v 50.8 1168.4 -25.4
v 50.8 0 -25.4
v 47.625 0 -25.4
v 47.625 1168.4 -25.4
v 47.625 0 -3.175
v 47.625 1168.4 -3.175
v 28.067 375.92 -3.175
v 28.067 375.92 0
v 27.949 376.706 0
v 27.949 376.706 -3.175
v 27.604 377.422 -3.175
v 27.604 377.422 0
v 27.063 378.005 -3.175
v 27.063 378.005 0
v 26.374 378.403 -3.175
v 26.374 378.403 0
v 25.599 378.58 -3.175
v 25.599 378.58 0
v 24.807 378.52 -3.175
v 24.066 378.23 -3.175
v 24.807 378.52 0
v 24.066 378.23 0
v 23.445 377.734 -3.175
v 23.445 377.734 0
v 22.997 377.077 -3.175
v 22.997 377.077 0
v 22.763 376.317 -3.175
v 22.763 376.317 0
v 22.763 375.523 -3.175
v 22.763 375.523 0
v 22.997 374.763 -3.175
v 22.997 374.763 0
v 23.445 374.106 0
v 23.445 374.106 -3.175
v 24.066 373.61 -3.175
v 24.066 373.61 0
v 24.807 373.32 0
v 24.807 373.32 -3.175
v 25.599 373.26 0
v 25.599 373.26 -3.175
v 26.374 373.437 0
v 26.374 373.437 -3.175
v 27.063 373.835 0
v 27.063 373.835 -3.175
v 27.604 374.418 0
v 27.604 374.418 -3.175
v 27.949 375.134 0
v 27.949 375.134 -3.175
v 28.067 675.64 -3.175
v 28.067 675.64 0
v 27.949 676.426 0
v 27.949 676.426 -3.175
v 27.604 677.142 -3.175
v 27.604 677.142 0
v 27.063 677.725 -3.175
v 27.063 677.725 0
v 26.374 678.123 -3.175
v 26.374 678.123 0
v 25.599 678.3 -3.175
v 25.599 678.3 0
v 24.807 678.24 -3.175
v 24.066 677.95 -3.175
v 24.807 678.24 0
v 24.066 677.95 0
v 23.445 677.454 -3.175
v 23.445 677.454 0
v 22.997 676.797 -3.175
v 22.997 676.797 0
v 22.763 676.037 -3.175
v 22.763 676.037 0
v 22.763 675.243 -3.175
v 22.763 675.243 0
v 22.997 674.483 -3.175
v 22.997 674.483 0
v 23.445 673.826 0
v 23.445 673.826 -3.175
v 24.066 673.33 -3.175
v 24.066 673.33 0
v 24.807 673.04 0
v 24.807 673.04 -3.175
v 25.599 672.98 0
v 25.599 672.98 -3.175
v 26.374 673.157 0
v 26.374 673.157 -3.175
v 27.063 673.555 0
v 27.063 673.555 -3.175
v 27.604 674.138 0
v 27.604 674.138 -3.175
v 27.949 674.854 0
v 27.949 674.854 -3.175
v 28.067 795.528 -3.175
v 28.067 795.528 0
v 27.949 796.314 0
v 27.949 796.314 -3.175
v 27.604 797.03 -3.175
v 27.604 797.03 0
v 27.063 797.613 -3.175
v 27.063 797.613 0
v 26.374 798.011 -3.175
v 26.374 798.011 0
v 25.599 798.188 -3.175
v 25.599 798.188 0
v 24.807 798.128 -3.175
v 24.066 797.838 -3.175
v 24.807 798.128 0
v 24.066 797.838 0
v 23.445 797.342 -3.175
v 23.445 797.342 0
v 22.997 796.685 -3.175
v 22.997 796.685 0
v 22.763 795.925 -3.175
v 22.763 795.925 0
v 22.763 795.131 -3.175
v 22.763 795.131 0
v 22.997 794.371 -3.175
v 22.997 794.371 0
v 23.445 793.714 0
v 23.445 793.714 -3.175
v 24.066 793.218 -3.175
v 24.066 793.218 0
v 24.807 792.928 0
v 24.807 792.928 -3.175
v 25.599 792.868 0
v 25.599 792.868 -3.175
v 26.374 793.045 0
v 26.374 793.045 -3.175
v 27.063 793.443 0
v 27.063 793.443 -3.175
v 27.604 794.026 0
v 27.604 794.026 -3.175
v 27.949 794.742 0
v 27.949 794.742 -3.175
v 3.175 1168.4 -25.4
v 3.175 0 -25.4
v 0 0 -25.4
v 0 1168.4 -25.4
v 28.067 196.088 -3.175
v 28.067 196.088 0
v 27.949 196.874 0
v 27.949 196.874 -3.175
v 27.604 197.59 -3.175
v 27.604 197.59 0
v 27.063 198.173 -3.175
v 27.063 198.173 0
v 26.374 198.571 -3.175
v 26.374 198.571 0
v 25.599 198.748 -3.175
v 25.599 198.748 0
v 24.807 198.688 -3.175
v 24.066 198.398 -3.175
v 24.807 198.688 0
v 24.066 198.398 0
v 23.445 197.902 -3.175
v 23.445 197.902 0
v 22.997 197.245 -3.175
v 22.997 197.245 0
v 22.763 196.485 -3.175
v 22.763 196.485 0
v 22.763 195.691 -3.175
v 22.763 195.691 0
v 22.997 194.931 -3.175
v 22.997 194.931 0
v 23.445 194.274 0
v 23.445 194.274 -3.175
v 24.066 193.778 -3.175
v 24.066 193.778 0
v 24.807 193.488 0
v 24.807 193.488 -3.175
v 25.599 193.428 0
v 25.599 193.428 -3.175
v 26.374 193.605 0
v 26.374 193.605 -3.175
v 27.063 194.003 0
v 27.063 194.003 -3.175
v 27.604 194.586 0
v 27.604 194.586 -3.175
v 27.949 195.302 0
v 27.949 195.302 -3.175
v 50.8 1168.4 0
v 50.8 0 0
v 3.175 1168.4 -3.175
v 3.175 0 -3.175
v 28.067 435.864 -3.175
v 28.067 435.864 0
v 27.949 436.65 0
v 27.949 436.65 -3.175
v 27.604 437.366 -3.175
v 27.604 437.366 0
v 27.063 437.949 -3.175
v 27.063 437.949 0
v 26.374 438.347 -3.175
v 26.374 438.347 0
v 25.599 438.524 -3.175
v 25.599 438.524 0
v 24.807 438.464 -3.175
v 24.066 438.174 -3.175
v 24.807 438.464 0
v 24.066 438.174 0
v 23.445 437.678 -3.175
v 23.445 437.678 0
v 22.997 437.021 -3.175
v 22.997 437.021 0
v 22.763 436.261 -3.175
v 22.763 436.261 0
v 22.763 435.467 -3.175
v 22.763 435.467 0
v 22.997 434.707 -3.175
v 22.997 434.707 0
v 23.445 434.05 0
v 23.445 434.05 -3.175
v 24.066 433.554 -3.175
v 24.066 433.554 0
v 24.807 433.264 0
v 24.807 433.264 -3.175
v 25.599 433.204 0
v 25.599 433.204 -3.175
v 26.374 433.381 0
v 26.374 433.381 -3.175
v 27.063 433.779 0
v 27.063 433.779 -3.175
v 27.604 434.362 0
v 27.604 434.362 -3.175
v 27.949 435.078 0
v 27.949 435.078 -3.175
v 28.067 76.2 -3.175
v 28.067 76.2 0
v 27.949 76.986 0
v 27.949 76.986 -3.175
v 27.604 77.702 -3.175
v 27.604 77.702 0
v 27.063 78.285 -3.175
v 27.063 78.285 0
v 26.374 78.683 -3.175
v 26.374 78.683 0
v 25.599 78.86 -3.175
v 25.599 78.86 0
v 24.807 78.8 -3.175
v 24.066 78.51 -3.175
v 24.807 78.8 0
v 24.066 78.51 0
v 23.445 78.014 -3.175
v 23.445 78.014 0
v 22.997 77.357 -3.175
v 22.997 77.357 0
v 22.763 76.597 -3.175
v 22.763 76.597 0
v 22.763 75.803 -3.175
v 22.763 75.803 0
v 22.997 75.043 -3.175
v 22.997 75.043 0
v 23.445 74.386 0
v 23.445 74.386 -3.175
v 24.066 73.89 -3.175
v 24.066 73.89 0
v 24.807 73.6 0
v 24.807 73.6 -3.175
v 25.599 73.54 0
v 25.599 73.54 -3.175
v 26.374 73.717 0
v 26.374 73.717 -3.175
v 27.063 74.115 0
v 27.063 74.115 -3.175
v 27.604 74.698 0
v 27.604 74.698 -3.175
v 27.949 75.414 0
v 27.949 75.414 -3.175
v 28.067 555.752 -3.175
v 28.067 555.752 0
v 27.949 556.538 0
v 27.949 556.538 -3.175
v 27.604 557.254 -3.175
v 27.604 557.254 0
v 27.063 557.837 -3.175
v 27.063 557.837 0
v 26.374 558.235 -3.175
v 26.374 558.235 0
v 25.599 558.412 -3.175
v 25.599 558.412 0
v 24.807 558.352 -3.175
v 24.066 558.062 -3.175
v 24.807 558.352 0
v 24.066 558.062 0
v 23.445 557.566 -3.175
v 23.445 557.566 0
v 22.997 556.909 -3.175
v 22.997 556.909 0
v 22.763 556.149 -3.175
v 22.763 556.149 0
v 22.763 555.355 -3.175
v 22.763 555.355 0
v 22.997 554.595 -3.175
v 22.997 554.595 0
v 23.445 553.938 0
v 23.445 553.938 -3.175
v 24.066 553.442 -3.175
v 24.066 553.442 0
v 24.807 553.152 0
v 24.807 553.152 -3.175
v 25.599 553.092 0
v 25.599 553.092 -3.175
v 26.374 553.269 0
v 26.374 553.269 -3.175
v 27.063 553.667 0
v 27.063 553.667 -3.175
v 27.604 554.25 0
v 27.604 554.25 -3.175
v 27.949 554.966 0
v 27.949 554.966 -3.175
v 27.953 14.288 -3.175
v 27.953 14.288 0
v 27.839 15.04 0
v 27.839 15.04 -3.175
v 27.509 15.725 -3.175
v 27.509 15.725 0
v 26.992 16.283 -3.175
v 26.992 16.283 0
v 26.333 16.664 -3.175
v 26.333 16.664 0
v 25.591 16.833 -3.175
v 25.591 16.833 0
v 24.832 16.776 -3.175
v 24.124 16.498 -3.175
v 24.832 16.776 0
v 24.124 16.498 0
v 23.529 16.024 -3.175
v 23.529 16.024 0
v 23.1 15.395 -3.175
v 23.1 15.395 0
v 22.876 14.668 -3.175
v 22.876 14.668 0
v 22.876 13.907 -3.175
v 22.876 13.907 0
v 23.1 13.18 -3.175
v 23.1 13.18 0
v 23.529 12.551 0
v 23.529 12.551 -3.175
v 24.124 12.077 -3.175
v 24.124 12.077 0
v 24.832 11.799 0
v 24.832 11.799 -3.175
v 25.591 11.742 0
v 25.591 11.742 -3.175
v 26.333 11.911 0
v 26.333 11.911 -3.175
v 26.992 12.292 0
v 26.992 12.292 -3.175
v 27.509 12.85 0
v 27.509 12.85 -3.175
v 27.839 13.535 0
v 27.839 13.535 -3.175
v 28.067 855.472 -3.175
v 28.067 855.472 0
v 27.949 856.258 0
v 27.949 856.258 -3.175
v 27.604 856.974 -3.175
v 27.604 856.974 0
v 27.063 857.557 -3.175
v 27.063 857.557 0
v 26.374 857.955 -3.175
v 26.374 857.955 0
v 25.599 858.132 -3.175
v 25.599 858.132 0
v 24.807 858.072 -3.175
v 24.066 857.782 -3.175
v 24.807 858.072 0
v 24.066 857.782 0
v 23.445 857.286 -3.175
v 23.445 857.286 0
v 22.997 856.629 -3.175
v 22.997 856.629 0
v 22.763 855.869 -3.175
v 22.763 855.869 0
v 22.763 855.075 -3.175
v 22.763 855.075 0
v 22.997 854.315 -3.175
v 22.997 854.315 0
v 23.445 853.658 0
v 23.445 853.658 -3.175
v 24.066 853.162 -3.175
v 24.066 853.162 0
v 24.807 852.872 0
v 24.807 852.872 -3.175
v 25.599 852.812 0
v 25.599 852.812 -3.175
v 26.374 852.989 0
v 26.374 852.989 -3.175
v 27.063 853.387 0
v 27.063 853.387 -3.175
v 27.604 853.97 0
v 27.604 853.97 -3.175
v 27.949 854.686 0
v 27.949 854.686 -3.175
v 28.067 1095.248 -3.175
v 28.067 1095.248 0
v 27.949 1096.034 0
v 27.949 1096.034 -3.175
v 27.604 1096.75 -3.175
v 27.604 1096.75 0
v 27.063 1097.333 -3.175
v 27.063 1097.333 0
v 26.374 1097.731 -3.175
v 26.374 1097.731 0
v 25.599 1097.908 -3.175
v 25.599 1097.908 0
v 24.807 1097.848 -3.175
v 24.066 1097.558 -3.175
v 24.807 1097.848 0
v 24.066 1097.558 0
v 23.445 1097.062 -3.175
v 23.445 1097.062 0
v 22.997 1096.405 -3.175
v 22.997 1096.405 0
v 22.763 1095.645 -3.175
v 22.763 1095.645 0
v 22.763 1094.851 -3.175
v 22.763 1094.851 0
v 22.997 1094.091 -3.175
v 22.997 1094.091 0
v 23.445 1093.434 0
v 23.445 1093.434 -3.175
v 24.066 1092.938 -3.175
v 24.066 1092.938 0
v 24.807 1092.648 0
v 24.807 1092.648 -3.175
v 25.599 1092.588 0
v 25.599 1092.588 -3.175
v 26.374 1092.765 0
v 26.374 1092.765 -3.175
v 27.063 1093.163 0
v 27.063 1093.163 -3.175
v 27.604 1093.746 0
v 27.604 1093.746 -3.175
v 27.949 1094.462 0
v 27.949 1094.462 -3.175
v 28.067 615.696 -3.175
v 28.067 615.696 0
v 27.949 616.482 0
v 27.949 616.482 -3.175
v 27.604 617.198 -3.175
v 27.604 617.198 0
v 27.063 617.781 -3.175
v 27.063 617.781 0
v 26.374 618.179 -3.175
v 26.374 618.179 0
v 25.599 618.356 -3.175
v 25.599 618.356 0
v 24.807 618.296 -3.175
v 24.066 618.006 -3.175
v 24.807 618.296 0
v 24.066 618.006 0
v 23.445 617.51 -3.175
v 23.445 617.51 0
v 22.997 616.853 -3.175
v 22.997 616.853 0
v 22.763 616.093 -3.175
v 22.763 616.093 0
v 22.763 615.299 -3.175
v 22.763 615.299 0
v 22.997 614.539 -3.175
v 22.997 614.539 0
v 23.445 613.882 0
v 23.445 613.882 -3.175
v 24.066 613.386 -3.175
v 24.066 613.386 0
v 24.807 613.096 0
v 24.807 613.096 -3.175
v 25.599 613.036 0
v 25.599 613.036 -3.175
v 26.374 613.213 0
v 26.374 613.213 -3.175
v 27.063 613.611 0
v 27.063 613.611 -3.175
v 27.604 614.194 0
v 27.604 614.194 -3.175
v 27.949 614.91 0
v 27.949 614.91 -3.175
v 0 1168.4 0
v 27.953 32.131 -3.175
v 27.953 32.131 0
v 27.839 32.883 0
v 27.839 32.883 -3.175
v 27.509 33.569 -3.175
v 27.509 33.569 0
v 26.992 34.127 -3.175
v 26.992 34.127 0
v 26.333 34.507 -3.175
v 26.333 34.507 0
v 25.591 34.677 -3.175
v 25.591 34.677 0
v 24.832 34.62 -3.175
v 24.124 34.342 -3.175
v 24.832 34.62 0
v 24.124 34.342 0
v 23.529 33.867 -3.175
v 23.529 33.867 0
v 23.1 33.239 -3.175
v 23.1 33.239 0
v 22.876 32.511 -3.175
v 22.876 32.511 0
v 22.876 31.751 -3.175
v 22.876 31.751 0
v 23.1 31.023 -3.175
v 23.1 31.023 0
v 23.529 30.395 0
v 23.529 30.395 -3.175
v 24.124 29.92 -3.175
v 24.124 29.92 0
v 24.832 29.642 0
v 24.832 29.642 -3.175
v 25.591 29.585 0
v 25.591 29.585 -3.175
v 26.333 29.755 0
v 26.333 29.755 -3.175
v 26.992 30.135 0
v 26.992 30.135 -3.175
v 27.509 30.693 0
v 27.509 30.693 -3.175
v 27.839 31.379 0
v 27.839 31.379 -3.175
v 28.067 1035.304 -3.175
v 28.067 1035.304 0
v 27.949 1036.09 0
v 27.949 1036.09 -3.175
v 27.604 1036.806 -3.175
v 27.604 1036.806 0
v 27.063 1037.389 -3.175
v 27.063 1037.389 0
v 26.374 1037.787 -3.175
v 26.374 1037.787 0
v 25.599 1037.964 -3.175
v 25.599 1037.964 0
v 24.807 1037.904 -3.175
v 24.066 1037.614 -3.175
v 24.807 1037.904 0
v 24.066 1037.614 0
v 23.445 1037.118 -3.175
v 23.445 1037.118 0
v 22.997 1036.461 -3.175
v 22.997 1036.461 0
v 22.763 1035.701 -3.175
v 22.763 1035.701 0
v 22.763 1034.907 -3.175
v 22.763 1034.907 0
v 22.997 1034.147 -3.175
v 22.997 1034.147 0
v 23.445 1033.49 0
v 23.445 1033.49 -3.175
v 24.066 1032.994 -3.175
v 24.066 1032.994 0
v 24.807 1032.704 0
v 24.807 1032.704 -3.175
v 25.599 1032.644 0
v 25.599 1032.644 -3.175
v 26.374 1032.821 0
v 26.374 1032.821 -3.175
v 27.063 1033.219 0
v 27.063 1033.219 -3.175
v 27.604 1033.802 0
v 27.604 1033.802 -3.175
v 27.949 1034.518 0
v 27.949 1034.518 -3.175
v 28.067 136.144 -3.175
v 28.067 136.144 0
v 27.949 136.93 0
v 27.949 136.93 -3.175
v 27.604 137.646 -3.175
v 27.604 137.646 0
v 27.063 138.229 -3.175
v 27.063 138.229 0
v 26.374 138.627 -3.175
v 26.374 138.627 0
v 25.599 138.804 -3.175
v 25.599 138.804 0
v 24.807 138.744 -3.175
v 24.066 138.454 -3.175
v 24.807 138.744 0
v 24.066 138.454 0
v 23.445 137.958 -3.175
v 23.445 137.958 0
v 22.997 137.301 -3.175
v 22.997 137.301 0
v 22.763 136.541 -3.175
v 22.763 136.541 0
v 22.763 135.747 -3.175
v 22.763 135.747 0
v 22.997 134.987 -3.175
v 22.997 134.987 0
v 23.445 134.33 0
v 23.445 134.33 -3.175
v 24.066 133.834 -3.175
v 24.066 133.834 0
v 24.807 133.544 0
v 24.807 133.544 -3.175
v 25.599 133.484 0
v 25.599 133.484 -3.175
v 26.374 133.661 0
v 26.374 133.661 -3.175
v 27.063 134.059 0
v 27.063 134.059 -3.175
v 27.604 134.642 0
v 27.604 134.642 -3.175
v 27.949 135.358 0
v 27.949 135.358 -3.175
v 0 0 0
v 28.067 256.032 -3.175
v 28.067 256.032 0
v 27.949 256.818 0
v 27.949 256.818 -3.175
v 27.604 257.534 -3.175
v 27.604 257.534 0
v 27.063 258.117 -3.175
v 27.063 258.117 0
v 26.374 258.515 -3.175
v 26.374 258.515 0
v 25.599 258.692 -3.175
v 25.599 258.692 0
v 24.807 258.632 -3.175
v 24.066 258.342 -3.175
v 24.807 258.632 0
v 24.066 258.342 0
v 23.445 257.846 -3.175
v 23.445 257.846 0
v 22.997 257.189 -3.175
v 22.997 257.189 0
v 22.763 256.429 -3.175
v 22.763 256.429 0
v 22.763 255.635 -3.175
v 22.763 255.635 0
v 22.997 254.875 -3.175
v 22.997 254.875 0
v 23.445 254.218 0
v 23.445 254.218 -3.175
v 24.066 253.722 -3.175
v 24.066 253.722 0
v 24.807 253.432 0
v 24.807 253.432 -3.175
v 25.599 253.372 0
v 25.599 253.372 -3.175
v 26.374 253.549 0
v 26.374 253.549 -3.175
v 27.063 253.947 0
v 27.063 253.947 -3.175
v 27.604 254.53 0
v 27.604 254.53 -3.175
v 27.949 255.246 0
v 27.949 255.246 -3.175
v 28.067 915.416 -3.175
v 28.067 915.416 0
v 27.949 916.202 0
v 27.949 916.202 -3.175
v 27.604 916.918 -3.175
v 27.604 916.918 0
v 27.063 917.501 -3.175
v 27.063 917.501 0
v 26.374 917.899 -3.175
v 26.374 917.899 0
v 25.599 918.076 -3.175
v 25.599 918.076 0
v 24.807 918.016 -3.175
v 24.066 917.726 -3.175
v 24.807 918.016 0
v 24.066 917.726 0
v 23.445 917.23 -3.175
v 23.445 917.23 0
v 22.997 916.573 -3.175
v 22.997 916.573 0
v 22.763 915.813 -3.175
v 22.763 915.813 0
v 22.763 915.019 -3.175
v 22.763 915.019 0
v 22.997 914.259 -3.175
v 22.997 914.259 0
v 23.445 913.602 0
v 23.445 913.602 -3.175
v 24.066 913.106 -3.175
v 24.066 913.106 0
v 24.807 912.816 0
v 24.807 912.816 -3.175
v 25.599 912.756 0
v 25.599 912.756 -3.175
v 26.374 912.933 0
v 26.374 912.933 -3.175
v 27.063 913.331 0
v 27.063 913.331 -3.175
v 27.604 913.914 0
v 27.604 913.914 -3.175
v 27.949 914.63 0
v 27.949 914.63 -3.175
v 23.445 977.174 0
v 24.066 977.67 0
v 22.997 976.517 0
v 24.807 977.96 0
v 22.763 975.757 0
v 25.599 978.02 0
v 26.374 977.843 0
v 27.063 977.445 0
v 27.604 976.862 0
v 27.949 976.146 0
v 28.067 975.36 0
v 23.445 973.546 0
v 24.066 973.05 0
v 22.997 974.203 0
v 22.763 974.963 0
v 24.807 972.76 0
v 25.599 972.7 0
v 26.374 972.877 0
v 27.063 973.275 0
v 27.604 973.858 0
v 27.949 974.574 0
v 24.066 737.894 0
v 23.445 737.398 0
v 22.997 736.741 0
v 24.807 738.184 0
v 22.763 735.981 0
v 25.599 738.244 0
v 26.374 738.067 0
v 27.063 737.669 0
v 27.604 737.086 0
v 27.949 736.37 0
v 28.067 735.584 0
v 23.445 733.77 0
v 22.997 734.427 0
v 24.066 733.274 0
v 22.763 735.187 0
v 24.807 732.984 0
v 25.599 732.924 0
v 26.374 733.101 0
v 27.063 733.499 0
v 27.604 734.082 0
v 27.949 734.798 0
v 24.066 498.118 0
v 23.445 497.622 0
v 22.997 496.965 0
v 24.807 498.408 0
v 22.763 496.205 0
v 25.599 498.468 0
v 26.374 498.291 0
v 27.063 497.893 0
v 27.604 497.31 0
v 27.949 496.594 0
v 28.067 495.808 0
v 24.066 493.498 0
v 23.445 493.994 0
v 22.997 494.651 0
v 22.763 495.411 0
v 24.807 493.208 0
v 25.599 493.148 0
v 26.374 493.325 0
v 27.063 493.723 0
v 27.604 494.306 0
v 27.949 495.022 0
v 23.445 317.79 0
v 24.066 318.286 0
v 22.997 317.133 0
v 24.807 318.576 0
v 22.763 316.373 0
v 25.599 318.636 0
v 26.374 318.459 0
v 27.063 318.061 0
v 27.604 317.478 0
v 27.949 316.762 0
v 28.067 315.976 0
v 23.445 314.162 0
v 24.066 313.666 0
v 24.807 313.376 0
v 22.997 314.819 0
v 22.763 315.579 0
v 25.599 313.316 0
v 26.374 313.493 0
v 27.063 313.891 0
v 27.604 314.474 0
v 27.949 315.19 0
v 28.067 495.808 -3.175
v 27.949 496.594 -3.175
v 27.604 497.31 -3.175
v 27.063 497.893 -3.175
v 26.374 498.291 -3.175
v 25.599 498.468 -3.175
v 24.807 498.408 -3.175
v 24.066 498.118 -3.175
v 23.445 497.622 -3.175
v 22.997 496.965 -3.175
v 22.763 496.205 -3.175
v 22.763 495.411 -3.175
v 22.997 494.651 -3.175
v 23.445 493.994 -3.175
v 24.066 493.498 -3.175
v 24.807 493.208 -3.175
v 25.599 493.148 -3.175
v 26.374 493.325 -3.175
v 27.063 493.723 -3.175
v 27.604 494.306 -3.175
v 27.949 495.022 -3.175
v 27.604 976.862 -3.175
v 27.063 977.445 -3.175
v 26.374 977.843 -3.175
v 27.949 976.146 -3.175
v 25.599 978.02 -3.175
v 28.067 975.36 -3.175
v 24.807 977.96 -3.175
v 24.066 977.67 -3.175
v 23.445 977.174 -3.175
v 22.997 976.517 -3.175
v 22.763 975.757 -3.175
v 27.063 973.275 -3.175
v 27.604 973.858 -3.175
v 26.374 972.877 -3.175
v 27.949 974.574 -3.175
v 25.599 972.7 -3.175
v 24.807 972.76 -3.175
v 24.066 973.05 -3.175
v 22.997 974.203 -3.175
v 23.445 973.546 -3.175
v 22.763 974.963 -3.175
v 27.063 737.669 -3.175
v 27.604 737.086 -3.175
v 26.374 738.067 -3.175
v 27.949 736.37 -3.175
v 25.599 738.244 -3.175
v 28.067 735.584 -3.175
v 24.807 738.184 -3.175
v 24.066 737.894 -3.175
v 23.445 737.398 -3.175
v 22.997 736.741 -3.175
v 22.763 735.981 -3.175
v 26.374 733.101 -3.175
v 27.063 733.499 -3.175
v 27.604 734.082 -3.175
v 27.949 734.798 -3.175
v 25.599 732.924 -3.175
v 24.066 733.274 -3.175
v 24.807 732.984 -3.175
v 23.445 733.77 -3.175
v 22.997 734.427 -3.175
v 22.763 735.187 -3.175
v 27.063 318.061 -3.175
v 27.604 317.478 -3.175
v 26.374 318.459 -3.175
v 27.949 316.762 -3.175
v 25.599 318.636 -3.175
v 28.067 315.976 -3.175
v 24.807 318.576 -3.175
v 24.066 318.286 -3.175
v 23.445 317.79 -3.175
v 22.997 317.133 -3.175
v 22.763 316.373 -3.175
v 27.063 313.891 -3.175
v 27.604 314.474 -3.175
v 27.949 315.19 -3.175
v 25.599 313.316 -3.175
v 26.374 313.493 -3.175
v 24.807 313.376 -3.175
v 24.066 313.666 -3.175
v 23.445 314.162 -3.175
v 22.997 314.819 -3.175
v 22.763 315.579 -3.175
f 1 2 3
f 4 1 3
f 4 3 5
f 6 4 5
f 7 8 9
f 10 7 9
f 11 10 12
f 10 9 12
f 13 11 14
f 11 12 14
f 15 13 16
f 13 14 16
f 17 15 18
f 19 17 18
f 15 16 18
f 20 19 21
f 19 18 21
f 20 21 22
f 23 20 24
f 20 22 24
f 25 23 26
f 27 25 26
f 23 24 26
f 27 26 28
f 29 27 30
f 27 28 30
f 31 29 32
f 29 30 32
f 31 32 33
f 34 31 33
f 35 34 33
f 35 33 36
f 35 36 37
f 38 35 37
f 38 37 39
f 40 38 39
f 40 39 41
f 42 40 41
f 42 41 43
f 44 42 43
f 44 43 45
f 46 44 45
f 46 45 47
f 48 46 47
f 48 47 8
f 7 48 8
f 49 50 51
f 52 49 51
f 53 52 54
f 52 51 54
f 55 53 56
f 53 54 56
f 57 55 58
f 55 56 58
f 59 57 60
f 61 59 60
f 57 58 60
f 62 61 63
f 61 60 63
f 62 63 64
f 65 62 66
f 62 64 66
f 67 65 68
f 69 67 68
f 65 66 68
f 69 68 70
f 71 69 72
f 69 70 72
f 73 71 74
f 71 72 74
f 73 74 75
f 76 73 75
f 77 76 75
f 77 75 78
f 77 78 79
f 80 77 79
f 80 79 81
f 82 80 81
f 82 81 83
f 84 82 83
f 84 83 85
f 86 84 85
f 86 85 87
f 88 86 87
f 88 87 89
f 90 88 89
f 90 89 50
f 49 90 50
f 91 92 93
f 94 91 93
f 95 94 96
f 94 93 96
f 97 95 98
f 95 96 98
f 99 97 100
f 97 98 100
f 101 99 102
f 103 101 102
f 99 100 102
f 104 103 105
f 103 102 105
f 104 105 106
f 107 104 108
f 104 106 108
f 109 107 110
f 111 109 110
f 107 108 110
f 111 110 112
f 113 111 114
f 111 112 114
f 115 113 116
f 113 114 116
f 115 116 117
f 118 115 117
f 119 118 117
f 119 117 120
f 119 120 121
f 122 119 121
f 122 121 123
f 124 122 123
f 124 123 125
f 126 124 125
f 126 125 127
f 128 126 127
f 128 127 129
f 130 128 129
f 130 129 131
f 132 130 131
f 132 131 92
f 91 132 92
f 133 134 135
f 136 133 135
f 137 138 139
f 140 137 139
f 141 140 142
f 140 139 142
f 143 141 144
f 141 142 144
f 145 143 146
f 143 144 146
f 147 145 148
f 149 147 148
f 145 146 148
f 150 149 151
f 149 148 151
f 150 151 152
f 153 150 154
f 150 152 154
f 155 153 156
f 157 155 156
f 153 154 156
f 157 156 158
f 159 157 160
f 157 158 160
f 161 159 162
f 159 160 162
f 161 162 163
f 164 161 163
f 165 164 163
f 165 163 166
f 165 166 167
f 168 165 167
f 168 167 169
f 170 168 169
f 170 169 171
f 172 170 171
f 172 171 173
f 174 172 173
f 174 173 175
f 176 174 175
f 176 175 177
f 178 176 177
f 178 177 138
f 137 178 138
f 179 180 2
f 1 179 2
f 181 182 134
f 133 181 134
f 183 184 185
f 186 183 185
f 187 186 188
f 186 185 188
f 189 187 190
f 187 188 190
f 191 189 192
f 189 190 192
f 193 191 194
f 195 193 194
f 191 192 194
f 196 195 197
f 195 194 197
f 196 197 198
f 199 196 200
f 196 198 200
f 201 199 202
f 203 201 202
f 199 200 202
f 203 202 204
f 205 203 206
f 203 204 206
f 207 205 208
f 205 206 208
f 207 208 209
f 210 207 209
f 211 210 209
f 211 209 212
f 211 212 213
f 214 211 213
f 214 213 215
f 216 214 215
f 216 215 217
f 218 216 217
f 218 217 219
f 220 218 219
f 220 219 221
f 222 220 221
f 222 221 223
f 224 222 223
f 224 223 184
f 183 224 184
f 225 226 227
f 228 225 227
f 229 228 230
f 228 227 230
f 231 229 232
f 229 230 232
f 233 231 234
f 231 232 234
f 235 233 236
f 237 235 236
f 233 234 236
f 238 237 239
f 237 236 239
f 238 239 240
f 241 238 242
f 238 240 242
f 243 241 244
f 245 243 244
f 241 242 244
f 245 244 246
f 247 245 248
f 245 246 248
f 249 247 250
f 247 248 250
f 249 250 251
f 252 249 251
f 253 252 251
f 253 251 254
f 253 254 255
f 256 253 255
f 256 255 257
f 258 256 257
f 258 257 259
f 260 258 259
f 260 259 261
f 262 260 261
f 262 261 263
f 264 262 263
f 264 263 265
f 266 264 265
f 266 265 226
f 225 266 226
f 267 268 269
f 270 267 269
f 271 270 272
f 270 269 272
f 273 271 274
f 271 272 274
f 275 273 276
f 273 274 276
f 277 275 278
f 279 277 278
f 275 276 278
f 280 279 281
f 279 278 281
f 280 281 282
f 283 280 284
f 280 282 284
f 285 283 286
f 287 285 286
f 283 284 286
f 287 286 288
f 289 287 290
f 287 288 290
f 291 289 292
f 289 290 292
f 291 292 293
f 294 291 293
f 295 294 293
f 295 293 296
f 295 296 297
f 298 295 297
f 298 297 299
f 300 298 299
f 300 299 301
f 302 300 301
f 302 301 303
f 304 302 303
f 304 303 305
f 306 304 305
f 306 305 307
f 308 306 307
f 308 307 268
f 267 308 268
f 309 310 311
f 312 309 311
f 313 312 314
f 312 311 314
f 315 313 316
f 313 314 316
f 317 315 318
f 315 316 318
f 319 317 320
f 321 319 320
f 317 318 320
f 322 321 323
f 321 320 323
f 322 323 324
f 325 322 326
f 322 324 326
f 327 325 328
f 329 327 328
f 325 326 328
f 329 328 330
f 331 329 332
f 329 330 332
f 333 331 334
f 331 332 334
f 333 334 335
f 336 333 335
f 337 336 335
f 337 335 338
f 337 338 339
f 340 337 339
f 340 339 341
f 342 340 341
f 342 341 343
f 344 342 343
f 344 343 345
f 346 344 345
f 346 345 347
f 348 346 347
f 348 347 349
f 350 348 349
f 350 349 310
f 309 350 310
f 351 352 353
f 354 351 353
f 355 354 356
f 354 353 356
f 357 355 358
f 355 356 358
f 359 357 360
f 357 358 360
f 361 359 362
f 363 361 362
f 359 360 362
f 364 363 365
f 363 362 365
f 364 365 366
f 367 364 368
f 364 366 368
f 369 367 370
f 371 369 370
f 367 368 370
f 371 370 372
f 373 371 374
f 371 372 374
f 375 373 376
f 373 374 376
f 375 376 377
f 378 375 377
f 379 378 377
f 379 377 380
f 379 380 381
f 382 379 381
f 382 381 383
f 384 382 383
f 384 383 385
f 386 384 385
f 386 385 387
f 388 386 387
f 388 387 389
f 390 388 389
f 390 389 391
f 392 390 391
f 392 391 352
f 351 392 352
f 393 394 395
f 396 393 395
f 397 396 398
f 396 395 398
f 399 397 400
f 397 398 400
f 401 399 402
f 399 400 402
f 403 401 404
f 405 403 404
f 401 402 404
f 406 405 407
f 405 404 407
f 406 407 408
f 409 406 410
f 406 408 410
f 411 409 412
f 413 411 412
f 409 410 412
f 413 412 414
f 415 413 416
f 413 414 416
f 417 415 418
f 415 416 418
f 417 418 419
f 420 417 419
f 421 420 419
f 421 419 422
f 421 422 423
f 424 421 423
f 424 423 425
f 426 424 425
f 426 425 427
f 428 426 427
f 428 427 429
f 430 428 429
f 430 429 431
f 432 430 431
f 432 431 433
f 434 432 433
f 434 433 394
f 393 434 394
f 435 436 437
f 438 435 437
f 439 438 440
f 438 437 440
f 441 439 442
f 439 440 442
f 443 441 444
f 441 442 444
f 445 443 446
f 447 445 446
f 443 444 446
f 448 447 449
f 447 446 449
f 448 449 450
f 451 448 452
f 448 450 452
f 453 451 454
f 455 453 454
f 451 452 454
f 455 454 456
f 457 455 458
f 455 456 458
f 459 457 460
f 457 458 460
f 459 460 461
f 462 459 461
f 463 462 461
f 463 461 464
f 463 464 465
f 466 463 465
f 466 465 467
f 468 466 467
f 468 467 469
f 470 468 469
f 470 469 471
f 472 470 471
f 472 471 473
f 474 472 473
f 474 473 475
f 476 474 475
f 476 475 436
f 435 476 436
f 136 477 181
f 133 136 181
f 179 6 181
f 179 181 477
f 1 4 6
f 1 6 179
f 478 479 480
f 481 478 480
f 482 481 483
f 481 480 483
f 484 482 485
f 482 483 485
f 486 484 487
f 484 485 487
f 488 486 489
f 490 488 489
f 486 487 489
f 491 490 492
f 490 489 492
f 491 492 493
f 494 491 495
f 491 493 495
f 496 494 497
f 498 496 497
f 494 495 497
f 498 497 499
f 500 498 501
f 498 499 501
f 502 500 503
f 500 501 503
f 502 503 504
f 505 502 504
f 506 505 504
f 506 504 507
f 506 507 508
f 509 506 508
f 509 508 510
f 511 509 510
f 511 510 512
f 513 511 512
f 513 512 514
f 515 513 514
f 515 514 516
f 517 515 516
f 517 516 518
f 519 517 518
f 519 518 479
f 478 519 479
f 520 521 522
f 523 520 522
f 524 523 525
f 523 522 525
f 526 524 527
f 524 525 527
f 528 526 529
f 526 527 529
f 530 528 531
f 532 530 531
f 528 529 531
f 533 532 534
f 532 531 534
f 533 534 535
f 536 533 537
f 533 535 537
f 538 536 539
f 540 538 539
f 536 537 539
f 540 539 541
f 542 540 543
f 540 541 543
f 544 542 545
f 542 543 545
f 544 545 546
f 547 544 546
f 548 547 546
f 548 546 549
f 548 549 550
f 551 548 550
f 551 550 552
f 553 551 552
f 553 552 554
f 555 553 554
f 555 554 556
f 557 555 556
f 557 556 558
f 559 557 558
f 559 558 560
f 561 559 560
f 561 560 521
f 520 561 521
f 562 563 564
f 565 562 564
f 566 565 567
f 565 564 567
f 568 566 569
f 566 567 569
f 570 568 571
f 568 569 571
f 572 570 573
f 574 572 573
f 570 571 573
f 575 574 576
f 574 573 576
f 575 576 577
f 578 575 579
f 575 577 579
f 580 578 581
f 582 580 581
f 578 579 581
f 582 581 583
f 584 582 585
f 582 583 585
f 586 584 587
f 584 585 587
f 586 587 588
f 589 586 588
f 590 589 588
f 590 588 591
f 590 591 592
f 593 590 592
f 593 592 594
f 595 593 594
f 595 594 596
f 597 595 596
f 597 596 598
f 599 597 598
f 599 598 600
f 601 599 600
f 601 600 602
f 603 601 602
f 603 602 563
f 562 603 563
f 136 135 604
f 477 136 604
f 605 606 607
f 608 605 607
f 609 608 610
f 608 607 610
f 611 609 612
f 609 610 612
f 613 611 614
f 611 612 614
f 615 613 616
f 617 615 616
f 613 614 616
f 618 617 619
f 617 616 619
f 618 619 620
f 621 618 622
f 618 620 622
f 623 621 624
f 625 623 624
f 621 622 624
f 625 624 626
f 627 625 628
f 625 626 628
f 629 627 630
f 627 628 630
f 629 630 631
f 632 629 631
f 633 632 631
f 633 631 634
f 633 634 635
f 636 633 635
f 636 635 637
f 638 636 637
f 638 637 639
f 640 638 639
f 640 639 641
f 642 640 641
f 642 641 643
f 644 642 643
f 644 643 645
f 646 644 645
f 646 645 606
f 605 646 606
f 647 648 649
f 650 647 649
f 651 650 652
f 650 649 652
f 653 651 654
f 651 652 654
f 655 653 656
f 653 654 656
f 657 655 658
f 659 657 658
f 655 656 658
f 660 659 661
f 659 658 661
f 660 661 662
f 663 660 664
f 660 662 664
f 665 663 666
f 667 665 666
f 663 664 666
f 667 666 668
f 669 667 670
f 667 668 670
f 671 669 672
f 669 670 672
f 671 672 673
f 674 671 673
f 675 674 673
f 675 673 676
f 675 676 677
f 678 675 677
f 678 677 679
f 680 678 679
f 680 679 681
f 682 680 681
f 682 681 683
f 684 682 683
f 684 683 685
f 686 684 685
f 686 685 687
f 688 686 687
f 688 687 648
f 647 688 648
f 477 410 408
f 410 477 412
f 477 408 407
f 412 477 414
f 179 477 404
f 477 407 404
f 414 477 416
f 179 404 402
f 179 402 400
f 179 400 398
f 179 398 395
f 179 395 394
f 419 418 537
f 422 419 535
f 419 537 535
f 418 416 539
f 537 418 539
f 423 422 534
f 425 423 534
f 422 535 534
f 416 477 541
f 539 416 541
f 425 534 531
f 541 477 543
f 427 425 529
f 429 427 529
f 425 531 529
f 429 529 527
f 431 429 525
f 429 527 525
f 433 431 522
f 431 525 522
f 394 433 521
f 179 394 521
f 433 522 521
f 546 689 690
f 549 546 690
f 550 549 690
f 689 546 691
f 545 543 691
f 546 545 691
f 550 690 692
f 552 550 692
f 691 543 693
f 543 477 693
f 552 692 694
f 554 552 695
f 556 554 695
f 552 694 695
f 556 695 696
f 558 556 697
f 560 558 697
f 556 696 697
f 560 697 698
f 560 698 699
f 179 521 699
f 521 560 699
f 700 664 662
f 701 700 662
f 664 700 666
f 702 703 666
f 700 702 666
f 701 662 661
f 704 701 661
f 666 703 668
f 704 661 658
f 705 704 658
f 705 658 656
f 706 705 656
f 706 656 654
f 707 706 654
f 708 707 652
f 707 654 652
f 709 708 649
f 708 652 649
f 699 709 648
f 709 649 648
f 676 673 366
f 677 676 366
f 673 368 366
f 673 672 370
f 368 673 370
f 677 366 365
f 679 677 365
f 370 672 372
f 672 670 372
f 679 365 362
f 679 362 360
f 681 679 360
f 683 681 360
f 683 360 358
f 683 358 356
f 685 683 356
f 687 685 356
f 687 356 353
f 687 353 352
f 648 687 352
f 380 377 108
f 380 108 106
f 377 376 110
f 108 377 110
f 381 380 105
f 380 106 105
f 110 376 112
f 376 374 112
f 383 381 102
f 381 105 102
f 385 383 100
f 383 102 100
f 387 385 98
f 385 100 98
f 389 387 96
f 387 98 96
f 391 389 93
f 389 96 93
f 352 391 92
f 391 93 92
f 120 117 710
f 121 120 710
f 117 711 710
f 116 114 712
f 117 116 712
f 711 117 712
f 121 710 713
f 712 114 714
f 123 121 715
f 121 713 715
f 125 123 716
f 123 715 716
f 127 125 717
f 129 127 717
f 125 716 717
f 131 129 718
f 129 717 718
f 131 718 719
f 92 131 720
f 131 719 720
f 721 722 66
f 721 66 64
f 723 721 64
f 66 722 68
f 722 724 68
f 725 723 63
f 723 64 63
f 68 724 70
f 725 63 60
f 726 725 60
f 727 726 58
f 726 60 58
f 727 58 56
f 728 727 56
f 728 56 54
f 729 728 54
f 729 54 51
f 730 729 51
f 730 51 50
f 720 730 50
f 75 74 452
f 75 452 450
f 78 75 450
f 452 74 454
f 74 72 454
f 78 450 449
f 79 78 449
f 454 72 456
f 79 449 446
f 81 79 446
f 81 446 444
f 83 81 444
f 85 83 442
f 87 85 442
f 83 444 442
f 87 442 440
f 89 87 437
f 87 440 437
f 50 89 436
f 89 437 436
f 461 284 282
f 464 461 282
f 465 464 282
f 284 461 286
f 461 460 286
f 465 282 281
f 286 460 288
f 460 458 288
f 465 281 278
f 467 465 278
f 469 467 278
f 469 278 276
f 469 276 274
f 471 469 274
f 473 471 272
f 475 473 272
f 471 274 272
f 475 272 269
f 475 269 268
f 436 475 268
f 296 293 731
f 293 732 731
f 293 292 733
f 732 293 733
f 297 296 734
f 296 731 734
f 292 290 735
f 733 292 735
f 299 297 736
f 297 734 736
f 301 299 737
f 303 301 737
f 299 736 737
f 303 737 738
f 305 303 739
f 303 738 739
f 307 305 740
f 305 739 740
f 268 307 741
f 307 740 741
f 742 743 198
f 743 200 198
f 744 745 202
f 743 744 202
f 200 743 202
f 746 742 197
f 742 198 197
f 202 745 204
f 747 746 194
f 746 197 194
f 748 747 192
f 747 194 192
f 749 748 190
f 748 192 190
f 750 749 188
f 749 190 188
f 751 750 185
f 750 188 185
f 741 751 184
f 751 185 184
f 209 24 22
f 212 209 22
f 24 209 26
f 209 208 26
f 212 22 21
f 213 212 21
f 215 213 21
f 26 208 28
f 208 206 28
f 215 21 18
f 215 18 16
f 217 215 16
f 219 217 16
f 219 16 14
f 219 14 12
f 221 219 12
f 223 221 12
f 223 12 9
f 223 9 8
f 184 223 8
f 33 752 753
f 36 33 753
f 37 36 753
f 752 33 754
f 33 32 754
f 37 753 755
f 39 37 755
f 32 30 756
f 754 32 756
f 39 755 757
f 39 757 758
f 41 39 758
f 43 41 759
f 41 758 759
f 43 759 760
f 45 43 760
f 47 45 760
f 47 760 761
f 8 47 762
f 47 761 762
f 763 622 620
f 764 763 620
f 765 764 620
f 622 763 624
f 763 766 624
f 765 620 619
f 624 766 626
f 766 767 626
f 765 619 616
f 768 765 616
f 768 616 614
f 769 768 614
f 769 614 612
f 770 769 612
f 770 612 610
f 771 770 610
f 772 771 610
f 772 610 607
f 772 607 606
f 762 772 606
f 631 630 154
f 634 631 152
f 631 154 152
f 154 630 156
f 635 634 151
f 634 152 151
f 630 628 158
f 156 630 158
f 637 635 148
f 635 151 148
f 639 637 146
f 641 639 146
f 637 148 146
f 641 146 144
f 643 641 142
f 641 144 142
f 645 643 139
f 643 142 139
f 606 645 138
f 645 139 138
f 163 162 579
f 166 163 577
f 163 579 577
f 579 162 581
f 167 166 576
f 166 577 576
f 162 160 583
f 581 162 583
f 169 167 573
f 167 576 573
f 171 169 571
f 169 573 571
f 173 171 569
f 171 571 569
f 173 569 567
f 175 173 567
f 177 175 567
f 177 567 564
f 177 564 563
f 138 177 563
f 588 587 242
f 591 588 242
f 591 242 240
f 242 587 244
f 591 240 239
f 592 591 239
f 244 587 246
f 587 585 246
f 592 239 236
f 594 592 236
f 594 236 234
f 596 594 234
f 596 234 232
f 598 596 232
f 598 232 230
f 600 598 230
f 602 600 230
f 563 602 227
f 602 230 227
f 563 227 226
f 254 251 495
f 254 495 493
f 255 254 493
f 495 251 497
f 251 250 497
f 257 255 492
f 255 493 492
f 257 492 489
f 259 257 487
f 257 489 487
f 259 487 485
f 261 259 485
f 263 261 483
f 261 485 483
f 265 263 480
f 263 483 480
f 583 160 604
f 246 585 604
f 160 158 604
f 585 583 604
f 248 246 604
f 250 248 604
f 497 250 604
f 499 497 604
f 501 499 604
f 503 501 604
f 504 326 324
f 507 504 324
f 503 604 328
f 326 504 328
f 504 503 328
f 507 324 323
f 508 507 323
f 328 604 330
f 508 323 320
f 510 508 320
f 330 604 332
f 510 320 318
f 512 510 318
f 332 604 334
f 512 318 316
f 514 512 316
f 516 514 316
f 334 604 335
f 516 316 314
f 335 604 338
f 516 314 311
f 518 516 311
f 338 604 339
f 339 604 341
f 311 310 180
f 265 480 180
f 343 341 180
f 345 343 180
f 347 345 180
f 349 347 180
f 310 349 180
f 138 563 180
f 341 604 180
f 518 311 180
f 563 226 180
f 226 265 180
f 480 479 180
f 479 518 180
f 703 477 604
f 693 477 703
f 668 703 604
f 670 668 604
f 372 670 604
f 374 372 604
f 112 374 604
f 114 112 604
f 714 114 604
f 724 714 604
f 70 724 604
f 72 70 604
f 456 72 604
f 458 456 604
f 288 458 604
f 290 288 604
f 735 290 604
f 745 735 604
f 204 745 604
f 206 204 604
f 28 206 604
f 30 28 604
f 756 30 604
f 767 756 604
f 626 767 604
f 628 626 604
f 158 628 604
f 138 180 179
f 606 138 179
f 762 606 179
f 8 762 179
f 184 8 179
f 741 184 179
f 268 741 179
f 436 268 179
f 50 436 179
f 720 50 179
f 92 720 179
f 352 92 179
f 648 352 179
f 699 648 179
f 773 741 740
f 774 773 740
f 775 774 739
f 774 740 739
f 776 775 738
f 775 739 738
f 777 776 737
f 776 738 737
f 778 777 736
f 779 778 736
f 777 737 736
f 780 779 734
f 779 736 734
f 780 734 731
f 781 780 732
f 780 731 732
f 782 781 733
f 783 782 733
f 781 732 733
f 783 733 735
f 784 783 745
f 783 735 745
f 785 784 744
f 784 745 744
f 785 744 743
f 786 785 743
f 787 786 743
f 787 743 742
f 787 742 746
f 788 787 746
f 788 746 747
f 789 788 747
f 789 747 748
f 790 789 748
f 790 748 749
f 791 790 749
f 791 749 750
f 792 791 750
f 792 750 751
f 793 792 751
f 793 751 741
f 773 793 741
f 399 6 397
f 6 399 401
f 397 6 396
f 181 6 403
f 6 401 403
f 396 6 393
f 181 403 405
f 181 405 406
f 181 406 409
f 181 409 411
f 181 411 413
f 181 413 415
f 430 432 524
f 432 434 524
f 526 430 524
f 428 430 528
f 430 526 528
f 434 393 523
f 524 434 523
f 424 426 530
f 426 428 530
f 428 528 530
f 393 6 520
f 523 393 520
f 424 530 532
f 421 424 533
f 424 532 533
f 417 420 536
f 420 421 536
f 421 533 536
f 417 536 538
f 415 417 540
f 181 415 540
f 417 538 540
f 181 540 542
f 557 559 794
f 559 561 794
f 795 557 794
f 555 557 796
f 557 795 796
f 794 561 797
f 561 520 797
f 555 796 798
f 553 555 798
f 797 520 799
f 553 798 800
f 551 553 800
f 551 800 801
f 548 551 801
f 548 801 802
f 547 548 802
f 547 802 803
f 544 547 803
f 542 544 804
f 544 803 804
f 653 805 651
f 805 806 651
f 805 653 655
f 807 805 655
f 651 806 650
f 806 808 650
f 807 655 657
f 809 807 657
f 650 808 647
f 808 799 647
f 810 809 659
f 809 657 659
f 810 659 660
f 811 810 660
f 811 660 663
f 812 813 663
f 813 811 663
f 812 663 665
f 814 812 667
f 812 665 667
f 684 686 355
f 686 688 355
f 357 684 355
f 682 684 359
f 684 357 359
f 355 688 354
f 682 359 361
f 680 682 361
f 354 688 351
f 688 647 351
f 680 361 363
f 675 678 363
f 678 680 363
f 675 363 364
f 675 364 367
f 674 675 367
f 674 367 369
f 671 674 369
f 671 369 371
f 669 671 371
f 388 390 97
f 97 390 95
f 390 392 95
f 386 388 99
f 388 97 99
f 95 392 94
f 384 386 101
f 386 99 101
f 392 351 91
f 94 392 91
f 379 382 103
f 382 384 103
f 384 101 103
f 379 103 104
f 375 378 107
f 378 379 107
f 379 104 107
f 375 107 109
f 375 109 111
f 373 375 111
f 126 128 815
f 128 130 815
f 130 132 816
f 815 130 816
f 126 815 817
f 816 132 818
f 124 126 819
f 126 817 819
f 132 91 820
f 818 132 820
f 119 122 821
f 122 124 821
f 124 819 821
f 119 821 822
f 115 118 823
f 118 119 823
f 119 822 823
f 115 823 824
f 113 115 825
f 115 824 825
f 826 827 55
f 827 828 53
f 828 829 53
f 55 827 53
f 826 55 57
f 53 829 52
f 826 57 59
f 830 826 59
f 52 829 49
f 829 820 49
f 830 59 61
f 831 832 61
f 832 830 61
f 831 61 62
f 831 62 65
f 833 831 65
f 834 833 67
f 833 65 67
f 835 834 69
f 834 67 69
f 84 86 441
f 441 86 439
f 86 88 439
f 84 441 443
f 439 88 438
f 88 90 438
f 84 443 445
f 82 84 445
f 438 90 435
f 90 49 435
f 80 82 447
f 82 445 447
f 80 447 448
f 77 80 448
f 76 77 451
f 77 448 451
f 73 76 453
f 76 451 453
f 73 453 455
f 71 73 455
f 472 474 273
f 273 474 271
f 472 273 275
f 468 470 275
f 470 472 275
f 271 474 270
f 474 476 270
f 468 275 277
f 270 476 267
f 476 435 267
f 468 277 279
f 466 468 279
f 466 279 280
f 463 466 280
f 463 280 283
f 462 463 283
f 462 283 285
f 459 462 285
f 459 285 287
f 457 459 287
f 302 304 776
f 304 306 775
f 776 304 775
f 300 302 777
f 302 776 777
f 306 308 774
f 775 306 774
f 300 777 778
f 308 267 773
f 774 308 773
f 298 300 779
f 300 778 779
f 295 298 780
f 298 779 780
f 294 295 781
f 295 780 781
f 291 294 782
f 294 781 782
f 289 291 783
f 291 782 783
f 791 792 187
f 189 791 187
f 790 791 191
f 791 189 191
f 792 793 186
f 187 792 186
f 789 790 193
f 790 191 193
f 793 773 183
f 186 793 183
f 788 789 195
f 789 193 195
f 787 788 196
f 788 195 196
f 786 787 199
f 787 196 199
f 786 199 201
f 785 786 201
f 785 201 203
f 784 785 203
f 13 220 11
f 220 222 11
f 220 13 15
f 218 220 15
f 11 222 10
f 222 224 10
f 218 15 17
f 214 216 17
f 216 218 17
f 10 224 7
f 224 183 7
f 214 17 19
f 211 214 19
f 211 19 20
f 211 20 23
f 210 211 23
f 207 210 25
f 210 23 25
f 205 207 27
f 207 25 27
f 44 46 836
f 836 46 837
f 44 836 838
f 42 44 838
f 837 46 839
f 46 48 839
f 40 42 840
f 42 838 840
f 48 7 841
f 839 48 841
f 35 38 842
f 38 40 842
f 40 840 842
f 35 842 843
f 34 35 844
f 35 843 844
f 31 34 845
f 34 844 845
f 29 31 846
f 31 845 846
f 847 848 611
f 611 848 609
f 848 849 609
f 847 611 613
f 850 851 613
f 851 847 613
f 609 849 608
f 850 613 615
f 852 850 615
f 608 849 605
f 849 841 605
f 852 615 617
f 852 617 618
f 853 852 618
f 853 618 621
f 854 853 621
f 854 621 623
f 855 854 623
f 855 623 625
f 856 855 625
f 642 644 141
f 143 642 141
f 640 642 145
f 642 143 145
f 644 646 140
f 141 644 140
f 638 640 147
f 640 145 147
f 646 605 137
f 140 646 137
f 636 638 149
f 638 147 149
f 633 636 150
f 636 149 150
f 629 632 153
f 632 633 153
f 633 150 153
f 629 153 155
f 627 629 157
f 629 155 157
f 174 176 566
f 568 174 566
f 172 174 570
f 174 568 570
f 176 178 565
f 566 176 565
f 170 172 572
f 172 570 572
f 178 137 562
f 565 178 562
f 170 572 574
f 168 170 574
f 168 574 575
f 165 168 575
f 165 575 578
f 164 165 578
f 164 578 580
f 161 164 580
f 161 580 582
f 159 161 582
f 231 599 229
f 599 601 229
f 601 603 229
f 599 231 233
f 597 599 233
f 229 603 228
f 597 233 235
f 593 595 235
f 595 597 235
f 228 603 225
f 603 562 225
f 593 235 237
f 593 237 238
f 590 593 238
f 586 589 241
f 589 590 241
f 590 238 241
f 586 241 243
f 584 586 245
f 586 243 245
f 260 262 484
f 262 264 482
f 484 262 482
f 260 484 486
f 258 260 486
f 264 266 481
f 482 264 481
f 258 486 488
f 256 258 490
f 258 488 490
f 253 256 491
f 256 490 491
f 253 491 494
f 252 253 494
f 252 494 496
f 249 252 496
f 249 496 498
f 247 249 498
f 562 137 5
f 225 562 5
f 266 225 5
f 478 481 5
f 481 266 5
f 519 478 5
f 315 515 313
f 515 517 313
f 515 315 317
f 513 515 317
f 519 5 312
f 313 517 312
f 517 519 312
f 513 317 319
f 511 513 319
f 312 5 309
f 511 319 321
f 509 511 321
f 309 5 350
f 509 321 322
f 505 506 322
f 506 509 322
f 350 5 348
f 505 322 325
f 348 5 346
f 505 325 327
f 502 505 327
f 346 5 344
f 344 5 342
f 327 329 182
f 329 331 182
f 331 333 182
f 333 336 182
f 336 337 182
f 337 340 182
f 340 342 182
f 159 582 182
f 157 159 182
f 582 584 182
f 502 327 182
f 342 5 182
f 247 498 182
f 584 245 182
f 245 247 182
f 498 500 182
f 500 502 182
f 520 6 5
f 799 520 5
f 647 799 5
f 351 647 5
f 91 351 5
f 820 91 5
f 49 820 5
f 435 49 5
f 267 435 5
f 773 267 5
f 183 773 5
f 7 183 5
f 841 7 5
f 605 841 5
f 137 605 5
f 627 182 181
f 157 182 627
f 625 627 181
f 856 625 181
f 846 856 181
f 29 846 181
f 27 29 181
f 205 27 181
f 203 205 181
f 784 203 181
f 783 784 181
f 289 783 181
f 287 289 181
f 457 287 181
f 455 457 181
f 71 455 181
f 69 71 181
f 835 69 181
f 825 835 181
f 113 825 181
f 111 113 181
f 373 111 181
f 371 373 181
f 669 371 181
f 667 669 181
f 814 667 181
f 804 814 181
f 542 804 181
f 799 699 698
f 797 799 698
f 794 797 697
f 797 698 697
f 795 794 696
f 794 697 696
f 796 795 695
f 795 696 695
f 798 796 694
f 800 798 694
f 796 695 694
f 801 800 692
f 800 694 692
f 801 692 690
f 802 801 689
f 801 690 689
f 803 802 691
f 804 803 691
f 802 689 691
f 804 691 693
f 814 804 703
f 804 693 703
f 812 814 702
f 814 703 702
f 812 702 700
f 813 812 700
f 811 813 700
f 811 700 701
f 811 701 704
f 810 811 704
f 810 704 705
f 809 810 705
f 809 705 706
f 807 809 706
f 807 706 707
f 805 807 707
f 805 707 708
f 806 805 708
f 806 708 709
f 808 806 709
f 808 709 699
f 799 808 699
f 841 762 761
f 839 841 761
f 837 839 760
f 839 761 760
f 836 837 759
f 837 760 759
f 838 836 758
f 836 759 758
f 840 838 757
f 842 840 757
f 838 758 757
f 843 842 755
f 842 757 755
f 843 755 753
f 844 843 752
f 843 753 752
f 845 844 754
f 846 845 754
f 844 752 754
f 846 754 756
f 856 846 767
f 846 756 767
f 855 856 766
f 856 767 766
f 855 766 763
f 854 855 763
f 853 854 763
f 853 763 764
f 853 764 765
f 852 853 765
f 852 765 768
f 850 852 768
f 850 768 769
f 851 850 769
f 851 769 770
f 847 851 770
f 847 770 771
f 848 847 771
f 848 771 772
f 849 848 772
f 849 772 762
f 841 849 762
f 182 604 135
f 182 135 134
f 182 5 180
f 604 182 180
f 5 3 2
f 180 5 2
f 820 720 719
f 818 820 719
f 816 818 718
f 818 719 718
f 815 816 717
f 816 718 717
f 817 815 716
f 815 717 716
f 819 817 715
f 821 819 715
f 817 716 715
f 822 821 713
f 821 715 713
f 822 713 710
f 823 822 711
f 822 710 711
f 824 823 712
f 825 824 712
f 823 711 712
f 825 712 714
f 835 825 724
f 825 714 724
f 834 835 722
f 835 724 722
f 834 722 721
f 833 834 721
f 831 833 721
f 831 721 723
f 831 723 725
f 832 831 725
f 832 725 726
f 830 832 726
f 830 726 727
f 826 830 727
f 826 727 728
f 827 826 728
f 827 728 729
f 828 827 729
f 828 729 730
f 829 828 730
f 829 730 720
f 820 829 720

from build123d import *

# Parameters (mm, degrees)
BOSS_EXTRUDE1_DEPTH = 1168.4
CUT_EXTRUDE1_REACH  = 27.4
SKETCH2_R           = 2.667
CUT_EXTRUDE2_REACH  = 27.4
SKETCH3_R           = 2.5527


with BuildPart() as part:
    # Sketch1 → Boss-Extrude1 (new body)
    with BuildSketch(Plane(origin=(0, 0, 0), x_dir=(1, 0, 0), z_dir=(0, 1, 0))):
        Polygon((3.175, 3.175), (3.175, 25.4), (0, 25.4), (0, 0), (50.8, 0), (50.8, 25.4), (47.625, 25.4), (47.625, 3.175), align=None)
    extrude(amount=BOSS_EXTRUDE1_DEPTH)

    # Sketch2 → Cut-Extrude1 (cut, up to next)
    with BuildSketch(Plane.XY, mode=Mode.PRIVATE) as cut_extrude1_sk1:
        with Locations((25.4, 76.2)):
            Circle(SKETCH2_R)
    cut_extrude1_tool1 = extrude(cut_extrude1_sk1.sketch, amount=-CUT_EXTRUDE1_REACH, mode=Mode.PRIVATE) & part.part
    add(cut_extrude1_tool1.solids().sort_by_distance((25.4, 76.2, 0))[0], mode=Mode.SUBTRACT)
    # Sketch2 → Cut-Extrude1 (cut, up to next)
    with BuildSketch(Plane.XY, mode=Mode.PRIVATE) as cut_extrude1_sk2:
        with Locations((25.4, 136.144)):
            Circle(SKETCH2_R)
    cut_extrude1_tool2 = extrude(cut_extrude1_sk2.sketch, amount=-CUT_EXTRUDE1_REACH, mode=Mode.PRIVATE) & part.part
    add(cut_extrude1_tool2.solids().sort_by_distance((25.4, 136.144, 0))[0], mode=Mode.SUBTRACT)
    # Sketch2 → Cut-Extrude1 (cut, up to next)
    with BuildSketch(Plane.XY, mode=Mode.PRIVATE) as cut_extrude1_sk3:
        with Locations((25.4, 196.088)):
            Circle(SKETCH2_R)
    cut_extrude1_tool3 = extrude(cut_extrude1_sk3.sketch, amount=-CUT_EXTRUDE1_REACH, mode=Mode.PRIVATE) & part.part
    add(cut_extrude1_tool3.solids().sort_by_distance((25.4, 196.088, 0))[0], mode=Mode.SUBTRACT)
    # Sketch2 → Cut-Extrude1 (cut, up to next)
    with BuildSketch(Plane.XY, mode=Mode.PRIVATE) as cut_extrude1_sk4:
        with Locations((25.4, 256.032)):
            Circle(SKETCH2_R)
    cut_extrude1_tool4 = extrude(cut_extrude1_sk4.sketch, amount=-CUT_EXTRUDE1_REACH, mode=Mode.PRIVATE) & part.part
    add(cut_extrude1_tool4.solids().sort_by_distance((25.4, 256.032, 0))[0], mode=Mode.SUBTRACT)
    # Sketch2 → Cut-Extrude1 (cut, up to next)
    with BuildSketch(Plane.XY, mode=Mode.PRIVATE) as cut_extrude1_sk5:
        with Locations((25.4, 315.976)):
            Circle(SKETCH2_R)
    cut_extrude1_tool5 = extrude(cut_extrude1_sk5.sketch, amount=-CUT_EXTRUDE1_REACH, mode=Mode.PRIVATE) & part.part
    add(cut_extrude1_tool5.solids().sort_by_distance((25.4, 315.976, 0))[0], mode=Mode.SUBTRACT)
    # Sketch2 → Cut-Extrude1 (cut, up to next)
    with BuildSketch(Plane.XY, mode=Mode.PRIVATE) as cut_extrude1_sk6:
        with Locations((25.4, 375.92)):
            Circle(SKETCH2_R)
    cut_extrude1_tool6 = extrude(cut_extrude1_sk6.sketch, amount=-CUT_EXTRUDE1_REACH, mode=Mode.PRIVATE) & part.part
    add(cut_extrude1_tool6.solids().sort_by_distance((25.4, 375.92, 0))[0], mode=Mode.SUBTRACT)
    # Sketch2 → Cut-Extrude1 (cut, up to next)
    with BuildSketch(Plane.XY, mode=Mode.PRIVATE) as cut_extrude1_sk7:
        with Locations((25.4, 435.864)):
            Circle(SKETCH2_R)
    cut_extrude1_tool7 = extrude(cut_extrude1_sk7.sketch, amount=-CUT_EXTRUDE1_REACH, mode=Mode.PRIVATE) & part.part
    add(cut_extrude1_tool7.solids().sort_by_distance((25.4, 435.864, 0))[0], mode=Mode.SUBTRACT)
    # Sketch2 → Cut-Extrude1 (cut, up to next)
    with BuildSketch(Plane.XY, mode=Mode.PRIVATE) as cut_extrude1_sk8:
        with Locations((25.4, 495.808)):
            Circle(SKETCH2_R)
    cut_extrude1_tool8 = extrude(cut_extrude1_sk8.sketch, amount=-CUT_EXTRUDE1_REACH, mode=Mode.PRIVATE) & part.part
    add(cut_extrude1_tool8.solids().sort_by_distance((25.4, 495.808, 0))[0], mode=Mode.SUBTRACT)
    # Sketch2 → Cut-Extrude1 (cut, up to next)
    with BuildSketch(Plane.XY, mode=Mode.PRIVATE) as cut_extrude1_sk9:
        with Locations((25.4, 555.752)):
            Circle(SKETCH2_R)
    cut_extrude1_tool9 = extrude(cut_extrude1_sk9.sketch, amount=-CUT_EXTRUDE1_REACH, mode=Mode.PRIVATE) & part.part
    add(cut_extrude1_tool9.solids().sort_by_distance((25.4, 555.752, 0))[0], mode=Mode.SUBTRACT)
    # Sketch2 → Cut-Extrude1 (cut, up to next)
    with BuildSketch(Plane.XY, mode=Mode.PRIVATE) as cut_extrude1_sk10:
        with Locations((25.4, 615.696)):
            Circle(SKETCH2_R)
    cut_extrude1_tool10 = extrude(cut_extrude1_sk10.sketch, amount=-CUT_EXTRUDE1_REACH, mode=Mode.PRIVATE) & part.part
    add(cut_extrude1_tool10.solids().sort_by_distance((25.4, 615.696, 0))[0], mode=Mode.SUBTRACT)
    # Sketch2 → Cut-Extrude1 (cut, up to next)
    with BuildSketch(Plane.XY, mode=Mode.PRIVATE) as cut_extrude1_sk11:
        with Locations((25.4, 675.64)):
            Circle(SKETCH2_R)
    cut_extrude1_tool11 = extrude(cut_extrude1_sk11.sketch, amount=-CUT_EXTRUDE1_REACH, mode=Mode.PRIVATE) & part.part
    add(cut_extrude1_tool11.solids().sort_by_distance((25.4, 675.64, 0))[0], mode=Mode.SUBTRACT)
    # Sketch2 → Cut-Extrude1 (cut, up to next)
    with BuildSketch(Plane.XY, mode=Mode.PRIVATE) as cut_extrude1_sk12:
        with Locations((25.4, 735.584)):
            Circle(SKETCH2_R)
    cut_extrude1_tool12 = extrude(cut_extrude1_sk12.sketch, amount=-CUT_EXTRUDE1_REACH, mode=Mode.PRIVATE) & part.part
    add(cut_extrude1_tool12.solids().sort_by_distance((25.4, 735.584, 0))[0], mode=Mode.SUBTRACT)
    # Sketch2 → Cut-Extrude1 (cut, up to next)
    with BuildSketch(Plane.XY, mode=Mode.PRIVATE) as cut_extrude1_sk13:
        with Locations((25.4, 795.528)):
            Circle(SKETCH2_R)
    cut_extrude1_tool13 = extrude(cut_extrude1_sk13.sketch, amount=-CUT_EXTRUDE1_REACH, mode=Mode.PRIVATE) & part.part
    add(cut_extrude1_tool13.solids().sort_by_distance((25.4, 795.528, 0))[0], mode=Mode.SUBTRACT)
    # Sketch2 → Cut-Extrude1 (cut, up to next)
    with BuildSketch(Plane.XY, mode=Mode.PRIVATE) as cut_extrude1_sk14:
        with Locations((25.4, 855.472)):
            Circle(SKETCH2_R)
    cut_extrude1_tool14 = extrude(cut_extrude1_sk14.sketch, amount=-CUT_EXTRUDE1_REACH, mode=Mode.PRIVATE) & part.part
    add(cut_extrude1_tool14.solids().sort_by_distance((25.4, 855.472, 0))[0], mode=Mode.SUBTRACT)
    # Sketch2 → Cut-Extrude1 (cut, up to next)
    with BuildSketch(Plane.XY, mode=Mode.PRIVATE) as cut_extrude1_sk15:
        with Locations((25.4, 915.416)):
            Circle(SKETCH2_R)
    cut_extrude1_tool15 = extrude(cut_extrude1_sk15.sketch, amount=-CUT_EXTRUDE1_REACH, mode=Mode.PRIVATE) & part.part
    add(cut_extrude1_tool15.solids().sort_by_distance((25.4, 915.416, 0))[0], mode=Mode.SUBTRACT)
    # Sketch2 → Cut-Extrude1 (cut, up to next)
    with BuildSketch(Plane.XY, mode=Mode.PRIVATE) as cut_extrude1_sk16:
        with Locations((25.4, 975.36)):
            Circle(SKETCH2_R)
    cut_extrude1_tool16 = extrude(cut_extrude1_sk16.sketch, amount=-CUT_EXTRUDE1_REACH, mode=Mode.PRIVATE) & part.part
    add(cut_extrude1_tool16.solids().sort_by_distance((25.4, 975.36, 0))[0], mode=Mode.SUBTRACT)
    # Sketch2 → Cut-Extrude1 (cut, up to next)
    with BuildSketch(Plane.XY, mode=Mode.PRIVATE) as cut_extrude1_sk17:
        with Locations((25.4, 1035.304)):
            Circle(SKETCH2_R)
    cut_extrude1_tool17 = extrude(cut_extrude1_sk17.sketch, amount=-CUT_EXTRUDE1_REACH, mode=Mode.PRIVATE) & part.part
    add(cut_extrude1_tool17.solids().sort_by_distance((25.4, 1035.304, 0))[0], mode=Mode.SUBTRACT)
    # Sketch2 → Cut-Extrude1 (cut, up to next)
    with BuildSketch(Plane.XY, mode=Mode.PRIVATE) as cut_extrude1_sk18:
        with Locations((25.4, 1095.248)):
            Circle(SKETCH2_R)
    cut_extrude1_tool18 = extrude(cut_extrude1_sk18.sketch, amount=-CUT_EXTRUDE1_REACH, mode=Mode.PRIVATE) & part.part
    add(cut_extrude1_tool18.solids().sort_by_distance((25.4, 1095.248, 0))[0], mode=Mode.SUBTRACT)

    # Sketch3 → Cut-Extrude2 (cut, up to next)
    with BuildSketch(Plane.XY, mode=Mode.PRIVATE) as cut_extrude2_sk1:
        with Locations((25.4, 32.131)):
            Circle(SKETCH3_R)
    cut_extrude2_tool1 = extrude(cut_extrude2_sk1.sketch, amount=-CUT_EXTRUDE2_REACH, mode=Mode.PRIVATE) & part.part
    add(cut_extrude2_tool1.solids().sort_by_distance((25.4, 32.131, 0))[0], mode=Mode.SUBTRACT)
    # Sketch3 → Cut-Extrude2 (cut, up to next)
    with BuildSketch(Plane.XY, mode=Mode.PRIVATE) as cut_extrude2_sk2:
        with Locations((25.4, 14.2875)):
            Circle(SKETCH3_R)
    cut_extrude2_tool2 = extrude(cut_extrude2_sk2.sketch, amount=-CUT_EXTRUDE2_REACH, mode=Mode.PRIVATE) & part.part
    add(cut_extrude2_tool2.solids().sort_by_distance((25.4, 14.2875, 0))[0], mode=Mode.SUBTRACT)


solid = part.part
